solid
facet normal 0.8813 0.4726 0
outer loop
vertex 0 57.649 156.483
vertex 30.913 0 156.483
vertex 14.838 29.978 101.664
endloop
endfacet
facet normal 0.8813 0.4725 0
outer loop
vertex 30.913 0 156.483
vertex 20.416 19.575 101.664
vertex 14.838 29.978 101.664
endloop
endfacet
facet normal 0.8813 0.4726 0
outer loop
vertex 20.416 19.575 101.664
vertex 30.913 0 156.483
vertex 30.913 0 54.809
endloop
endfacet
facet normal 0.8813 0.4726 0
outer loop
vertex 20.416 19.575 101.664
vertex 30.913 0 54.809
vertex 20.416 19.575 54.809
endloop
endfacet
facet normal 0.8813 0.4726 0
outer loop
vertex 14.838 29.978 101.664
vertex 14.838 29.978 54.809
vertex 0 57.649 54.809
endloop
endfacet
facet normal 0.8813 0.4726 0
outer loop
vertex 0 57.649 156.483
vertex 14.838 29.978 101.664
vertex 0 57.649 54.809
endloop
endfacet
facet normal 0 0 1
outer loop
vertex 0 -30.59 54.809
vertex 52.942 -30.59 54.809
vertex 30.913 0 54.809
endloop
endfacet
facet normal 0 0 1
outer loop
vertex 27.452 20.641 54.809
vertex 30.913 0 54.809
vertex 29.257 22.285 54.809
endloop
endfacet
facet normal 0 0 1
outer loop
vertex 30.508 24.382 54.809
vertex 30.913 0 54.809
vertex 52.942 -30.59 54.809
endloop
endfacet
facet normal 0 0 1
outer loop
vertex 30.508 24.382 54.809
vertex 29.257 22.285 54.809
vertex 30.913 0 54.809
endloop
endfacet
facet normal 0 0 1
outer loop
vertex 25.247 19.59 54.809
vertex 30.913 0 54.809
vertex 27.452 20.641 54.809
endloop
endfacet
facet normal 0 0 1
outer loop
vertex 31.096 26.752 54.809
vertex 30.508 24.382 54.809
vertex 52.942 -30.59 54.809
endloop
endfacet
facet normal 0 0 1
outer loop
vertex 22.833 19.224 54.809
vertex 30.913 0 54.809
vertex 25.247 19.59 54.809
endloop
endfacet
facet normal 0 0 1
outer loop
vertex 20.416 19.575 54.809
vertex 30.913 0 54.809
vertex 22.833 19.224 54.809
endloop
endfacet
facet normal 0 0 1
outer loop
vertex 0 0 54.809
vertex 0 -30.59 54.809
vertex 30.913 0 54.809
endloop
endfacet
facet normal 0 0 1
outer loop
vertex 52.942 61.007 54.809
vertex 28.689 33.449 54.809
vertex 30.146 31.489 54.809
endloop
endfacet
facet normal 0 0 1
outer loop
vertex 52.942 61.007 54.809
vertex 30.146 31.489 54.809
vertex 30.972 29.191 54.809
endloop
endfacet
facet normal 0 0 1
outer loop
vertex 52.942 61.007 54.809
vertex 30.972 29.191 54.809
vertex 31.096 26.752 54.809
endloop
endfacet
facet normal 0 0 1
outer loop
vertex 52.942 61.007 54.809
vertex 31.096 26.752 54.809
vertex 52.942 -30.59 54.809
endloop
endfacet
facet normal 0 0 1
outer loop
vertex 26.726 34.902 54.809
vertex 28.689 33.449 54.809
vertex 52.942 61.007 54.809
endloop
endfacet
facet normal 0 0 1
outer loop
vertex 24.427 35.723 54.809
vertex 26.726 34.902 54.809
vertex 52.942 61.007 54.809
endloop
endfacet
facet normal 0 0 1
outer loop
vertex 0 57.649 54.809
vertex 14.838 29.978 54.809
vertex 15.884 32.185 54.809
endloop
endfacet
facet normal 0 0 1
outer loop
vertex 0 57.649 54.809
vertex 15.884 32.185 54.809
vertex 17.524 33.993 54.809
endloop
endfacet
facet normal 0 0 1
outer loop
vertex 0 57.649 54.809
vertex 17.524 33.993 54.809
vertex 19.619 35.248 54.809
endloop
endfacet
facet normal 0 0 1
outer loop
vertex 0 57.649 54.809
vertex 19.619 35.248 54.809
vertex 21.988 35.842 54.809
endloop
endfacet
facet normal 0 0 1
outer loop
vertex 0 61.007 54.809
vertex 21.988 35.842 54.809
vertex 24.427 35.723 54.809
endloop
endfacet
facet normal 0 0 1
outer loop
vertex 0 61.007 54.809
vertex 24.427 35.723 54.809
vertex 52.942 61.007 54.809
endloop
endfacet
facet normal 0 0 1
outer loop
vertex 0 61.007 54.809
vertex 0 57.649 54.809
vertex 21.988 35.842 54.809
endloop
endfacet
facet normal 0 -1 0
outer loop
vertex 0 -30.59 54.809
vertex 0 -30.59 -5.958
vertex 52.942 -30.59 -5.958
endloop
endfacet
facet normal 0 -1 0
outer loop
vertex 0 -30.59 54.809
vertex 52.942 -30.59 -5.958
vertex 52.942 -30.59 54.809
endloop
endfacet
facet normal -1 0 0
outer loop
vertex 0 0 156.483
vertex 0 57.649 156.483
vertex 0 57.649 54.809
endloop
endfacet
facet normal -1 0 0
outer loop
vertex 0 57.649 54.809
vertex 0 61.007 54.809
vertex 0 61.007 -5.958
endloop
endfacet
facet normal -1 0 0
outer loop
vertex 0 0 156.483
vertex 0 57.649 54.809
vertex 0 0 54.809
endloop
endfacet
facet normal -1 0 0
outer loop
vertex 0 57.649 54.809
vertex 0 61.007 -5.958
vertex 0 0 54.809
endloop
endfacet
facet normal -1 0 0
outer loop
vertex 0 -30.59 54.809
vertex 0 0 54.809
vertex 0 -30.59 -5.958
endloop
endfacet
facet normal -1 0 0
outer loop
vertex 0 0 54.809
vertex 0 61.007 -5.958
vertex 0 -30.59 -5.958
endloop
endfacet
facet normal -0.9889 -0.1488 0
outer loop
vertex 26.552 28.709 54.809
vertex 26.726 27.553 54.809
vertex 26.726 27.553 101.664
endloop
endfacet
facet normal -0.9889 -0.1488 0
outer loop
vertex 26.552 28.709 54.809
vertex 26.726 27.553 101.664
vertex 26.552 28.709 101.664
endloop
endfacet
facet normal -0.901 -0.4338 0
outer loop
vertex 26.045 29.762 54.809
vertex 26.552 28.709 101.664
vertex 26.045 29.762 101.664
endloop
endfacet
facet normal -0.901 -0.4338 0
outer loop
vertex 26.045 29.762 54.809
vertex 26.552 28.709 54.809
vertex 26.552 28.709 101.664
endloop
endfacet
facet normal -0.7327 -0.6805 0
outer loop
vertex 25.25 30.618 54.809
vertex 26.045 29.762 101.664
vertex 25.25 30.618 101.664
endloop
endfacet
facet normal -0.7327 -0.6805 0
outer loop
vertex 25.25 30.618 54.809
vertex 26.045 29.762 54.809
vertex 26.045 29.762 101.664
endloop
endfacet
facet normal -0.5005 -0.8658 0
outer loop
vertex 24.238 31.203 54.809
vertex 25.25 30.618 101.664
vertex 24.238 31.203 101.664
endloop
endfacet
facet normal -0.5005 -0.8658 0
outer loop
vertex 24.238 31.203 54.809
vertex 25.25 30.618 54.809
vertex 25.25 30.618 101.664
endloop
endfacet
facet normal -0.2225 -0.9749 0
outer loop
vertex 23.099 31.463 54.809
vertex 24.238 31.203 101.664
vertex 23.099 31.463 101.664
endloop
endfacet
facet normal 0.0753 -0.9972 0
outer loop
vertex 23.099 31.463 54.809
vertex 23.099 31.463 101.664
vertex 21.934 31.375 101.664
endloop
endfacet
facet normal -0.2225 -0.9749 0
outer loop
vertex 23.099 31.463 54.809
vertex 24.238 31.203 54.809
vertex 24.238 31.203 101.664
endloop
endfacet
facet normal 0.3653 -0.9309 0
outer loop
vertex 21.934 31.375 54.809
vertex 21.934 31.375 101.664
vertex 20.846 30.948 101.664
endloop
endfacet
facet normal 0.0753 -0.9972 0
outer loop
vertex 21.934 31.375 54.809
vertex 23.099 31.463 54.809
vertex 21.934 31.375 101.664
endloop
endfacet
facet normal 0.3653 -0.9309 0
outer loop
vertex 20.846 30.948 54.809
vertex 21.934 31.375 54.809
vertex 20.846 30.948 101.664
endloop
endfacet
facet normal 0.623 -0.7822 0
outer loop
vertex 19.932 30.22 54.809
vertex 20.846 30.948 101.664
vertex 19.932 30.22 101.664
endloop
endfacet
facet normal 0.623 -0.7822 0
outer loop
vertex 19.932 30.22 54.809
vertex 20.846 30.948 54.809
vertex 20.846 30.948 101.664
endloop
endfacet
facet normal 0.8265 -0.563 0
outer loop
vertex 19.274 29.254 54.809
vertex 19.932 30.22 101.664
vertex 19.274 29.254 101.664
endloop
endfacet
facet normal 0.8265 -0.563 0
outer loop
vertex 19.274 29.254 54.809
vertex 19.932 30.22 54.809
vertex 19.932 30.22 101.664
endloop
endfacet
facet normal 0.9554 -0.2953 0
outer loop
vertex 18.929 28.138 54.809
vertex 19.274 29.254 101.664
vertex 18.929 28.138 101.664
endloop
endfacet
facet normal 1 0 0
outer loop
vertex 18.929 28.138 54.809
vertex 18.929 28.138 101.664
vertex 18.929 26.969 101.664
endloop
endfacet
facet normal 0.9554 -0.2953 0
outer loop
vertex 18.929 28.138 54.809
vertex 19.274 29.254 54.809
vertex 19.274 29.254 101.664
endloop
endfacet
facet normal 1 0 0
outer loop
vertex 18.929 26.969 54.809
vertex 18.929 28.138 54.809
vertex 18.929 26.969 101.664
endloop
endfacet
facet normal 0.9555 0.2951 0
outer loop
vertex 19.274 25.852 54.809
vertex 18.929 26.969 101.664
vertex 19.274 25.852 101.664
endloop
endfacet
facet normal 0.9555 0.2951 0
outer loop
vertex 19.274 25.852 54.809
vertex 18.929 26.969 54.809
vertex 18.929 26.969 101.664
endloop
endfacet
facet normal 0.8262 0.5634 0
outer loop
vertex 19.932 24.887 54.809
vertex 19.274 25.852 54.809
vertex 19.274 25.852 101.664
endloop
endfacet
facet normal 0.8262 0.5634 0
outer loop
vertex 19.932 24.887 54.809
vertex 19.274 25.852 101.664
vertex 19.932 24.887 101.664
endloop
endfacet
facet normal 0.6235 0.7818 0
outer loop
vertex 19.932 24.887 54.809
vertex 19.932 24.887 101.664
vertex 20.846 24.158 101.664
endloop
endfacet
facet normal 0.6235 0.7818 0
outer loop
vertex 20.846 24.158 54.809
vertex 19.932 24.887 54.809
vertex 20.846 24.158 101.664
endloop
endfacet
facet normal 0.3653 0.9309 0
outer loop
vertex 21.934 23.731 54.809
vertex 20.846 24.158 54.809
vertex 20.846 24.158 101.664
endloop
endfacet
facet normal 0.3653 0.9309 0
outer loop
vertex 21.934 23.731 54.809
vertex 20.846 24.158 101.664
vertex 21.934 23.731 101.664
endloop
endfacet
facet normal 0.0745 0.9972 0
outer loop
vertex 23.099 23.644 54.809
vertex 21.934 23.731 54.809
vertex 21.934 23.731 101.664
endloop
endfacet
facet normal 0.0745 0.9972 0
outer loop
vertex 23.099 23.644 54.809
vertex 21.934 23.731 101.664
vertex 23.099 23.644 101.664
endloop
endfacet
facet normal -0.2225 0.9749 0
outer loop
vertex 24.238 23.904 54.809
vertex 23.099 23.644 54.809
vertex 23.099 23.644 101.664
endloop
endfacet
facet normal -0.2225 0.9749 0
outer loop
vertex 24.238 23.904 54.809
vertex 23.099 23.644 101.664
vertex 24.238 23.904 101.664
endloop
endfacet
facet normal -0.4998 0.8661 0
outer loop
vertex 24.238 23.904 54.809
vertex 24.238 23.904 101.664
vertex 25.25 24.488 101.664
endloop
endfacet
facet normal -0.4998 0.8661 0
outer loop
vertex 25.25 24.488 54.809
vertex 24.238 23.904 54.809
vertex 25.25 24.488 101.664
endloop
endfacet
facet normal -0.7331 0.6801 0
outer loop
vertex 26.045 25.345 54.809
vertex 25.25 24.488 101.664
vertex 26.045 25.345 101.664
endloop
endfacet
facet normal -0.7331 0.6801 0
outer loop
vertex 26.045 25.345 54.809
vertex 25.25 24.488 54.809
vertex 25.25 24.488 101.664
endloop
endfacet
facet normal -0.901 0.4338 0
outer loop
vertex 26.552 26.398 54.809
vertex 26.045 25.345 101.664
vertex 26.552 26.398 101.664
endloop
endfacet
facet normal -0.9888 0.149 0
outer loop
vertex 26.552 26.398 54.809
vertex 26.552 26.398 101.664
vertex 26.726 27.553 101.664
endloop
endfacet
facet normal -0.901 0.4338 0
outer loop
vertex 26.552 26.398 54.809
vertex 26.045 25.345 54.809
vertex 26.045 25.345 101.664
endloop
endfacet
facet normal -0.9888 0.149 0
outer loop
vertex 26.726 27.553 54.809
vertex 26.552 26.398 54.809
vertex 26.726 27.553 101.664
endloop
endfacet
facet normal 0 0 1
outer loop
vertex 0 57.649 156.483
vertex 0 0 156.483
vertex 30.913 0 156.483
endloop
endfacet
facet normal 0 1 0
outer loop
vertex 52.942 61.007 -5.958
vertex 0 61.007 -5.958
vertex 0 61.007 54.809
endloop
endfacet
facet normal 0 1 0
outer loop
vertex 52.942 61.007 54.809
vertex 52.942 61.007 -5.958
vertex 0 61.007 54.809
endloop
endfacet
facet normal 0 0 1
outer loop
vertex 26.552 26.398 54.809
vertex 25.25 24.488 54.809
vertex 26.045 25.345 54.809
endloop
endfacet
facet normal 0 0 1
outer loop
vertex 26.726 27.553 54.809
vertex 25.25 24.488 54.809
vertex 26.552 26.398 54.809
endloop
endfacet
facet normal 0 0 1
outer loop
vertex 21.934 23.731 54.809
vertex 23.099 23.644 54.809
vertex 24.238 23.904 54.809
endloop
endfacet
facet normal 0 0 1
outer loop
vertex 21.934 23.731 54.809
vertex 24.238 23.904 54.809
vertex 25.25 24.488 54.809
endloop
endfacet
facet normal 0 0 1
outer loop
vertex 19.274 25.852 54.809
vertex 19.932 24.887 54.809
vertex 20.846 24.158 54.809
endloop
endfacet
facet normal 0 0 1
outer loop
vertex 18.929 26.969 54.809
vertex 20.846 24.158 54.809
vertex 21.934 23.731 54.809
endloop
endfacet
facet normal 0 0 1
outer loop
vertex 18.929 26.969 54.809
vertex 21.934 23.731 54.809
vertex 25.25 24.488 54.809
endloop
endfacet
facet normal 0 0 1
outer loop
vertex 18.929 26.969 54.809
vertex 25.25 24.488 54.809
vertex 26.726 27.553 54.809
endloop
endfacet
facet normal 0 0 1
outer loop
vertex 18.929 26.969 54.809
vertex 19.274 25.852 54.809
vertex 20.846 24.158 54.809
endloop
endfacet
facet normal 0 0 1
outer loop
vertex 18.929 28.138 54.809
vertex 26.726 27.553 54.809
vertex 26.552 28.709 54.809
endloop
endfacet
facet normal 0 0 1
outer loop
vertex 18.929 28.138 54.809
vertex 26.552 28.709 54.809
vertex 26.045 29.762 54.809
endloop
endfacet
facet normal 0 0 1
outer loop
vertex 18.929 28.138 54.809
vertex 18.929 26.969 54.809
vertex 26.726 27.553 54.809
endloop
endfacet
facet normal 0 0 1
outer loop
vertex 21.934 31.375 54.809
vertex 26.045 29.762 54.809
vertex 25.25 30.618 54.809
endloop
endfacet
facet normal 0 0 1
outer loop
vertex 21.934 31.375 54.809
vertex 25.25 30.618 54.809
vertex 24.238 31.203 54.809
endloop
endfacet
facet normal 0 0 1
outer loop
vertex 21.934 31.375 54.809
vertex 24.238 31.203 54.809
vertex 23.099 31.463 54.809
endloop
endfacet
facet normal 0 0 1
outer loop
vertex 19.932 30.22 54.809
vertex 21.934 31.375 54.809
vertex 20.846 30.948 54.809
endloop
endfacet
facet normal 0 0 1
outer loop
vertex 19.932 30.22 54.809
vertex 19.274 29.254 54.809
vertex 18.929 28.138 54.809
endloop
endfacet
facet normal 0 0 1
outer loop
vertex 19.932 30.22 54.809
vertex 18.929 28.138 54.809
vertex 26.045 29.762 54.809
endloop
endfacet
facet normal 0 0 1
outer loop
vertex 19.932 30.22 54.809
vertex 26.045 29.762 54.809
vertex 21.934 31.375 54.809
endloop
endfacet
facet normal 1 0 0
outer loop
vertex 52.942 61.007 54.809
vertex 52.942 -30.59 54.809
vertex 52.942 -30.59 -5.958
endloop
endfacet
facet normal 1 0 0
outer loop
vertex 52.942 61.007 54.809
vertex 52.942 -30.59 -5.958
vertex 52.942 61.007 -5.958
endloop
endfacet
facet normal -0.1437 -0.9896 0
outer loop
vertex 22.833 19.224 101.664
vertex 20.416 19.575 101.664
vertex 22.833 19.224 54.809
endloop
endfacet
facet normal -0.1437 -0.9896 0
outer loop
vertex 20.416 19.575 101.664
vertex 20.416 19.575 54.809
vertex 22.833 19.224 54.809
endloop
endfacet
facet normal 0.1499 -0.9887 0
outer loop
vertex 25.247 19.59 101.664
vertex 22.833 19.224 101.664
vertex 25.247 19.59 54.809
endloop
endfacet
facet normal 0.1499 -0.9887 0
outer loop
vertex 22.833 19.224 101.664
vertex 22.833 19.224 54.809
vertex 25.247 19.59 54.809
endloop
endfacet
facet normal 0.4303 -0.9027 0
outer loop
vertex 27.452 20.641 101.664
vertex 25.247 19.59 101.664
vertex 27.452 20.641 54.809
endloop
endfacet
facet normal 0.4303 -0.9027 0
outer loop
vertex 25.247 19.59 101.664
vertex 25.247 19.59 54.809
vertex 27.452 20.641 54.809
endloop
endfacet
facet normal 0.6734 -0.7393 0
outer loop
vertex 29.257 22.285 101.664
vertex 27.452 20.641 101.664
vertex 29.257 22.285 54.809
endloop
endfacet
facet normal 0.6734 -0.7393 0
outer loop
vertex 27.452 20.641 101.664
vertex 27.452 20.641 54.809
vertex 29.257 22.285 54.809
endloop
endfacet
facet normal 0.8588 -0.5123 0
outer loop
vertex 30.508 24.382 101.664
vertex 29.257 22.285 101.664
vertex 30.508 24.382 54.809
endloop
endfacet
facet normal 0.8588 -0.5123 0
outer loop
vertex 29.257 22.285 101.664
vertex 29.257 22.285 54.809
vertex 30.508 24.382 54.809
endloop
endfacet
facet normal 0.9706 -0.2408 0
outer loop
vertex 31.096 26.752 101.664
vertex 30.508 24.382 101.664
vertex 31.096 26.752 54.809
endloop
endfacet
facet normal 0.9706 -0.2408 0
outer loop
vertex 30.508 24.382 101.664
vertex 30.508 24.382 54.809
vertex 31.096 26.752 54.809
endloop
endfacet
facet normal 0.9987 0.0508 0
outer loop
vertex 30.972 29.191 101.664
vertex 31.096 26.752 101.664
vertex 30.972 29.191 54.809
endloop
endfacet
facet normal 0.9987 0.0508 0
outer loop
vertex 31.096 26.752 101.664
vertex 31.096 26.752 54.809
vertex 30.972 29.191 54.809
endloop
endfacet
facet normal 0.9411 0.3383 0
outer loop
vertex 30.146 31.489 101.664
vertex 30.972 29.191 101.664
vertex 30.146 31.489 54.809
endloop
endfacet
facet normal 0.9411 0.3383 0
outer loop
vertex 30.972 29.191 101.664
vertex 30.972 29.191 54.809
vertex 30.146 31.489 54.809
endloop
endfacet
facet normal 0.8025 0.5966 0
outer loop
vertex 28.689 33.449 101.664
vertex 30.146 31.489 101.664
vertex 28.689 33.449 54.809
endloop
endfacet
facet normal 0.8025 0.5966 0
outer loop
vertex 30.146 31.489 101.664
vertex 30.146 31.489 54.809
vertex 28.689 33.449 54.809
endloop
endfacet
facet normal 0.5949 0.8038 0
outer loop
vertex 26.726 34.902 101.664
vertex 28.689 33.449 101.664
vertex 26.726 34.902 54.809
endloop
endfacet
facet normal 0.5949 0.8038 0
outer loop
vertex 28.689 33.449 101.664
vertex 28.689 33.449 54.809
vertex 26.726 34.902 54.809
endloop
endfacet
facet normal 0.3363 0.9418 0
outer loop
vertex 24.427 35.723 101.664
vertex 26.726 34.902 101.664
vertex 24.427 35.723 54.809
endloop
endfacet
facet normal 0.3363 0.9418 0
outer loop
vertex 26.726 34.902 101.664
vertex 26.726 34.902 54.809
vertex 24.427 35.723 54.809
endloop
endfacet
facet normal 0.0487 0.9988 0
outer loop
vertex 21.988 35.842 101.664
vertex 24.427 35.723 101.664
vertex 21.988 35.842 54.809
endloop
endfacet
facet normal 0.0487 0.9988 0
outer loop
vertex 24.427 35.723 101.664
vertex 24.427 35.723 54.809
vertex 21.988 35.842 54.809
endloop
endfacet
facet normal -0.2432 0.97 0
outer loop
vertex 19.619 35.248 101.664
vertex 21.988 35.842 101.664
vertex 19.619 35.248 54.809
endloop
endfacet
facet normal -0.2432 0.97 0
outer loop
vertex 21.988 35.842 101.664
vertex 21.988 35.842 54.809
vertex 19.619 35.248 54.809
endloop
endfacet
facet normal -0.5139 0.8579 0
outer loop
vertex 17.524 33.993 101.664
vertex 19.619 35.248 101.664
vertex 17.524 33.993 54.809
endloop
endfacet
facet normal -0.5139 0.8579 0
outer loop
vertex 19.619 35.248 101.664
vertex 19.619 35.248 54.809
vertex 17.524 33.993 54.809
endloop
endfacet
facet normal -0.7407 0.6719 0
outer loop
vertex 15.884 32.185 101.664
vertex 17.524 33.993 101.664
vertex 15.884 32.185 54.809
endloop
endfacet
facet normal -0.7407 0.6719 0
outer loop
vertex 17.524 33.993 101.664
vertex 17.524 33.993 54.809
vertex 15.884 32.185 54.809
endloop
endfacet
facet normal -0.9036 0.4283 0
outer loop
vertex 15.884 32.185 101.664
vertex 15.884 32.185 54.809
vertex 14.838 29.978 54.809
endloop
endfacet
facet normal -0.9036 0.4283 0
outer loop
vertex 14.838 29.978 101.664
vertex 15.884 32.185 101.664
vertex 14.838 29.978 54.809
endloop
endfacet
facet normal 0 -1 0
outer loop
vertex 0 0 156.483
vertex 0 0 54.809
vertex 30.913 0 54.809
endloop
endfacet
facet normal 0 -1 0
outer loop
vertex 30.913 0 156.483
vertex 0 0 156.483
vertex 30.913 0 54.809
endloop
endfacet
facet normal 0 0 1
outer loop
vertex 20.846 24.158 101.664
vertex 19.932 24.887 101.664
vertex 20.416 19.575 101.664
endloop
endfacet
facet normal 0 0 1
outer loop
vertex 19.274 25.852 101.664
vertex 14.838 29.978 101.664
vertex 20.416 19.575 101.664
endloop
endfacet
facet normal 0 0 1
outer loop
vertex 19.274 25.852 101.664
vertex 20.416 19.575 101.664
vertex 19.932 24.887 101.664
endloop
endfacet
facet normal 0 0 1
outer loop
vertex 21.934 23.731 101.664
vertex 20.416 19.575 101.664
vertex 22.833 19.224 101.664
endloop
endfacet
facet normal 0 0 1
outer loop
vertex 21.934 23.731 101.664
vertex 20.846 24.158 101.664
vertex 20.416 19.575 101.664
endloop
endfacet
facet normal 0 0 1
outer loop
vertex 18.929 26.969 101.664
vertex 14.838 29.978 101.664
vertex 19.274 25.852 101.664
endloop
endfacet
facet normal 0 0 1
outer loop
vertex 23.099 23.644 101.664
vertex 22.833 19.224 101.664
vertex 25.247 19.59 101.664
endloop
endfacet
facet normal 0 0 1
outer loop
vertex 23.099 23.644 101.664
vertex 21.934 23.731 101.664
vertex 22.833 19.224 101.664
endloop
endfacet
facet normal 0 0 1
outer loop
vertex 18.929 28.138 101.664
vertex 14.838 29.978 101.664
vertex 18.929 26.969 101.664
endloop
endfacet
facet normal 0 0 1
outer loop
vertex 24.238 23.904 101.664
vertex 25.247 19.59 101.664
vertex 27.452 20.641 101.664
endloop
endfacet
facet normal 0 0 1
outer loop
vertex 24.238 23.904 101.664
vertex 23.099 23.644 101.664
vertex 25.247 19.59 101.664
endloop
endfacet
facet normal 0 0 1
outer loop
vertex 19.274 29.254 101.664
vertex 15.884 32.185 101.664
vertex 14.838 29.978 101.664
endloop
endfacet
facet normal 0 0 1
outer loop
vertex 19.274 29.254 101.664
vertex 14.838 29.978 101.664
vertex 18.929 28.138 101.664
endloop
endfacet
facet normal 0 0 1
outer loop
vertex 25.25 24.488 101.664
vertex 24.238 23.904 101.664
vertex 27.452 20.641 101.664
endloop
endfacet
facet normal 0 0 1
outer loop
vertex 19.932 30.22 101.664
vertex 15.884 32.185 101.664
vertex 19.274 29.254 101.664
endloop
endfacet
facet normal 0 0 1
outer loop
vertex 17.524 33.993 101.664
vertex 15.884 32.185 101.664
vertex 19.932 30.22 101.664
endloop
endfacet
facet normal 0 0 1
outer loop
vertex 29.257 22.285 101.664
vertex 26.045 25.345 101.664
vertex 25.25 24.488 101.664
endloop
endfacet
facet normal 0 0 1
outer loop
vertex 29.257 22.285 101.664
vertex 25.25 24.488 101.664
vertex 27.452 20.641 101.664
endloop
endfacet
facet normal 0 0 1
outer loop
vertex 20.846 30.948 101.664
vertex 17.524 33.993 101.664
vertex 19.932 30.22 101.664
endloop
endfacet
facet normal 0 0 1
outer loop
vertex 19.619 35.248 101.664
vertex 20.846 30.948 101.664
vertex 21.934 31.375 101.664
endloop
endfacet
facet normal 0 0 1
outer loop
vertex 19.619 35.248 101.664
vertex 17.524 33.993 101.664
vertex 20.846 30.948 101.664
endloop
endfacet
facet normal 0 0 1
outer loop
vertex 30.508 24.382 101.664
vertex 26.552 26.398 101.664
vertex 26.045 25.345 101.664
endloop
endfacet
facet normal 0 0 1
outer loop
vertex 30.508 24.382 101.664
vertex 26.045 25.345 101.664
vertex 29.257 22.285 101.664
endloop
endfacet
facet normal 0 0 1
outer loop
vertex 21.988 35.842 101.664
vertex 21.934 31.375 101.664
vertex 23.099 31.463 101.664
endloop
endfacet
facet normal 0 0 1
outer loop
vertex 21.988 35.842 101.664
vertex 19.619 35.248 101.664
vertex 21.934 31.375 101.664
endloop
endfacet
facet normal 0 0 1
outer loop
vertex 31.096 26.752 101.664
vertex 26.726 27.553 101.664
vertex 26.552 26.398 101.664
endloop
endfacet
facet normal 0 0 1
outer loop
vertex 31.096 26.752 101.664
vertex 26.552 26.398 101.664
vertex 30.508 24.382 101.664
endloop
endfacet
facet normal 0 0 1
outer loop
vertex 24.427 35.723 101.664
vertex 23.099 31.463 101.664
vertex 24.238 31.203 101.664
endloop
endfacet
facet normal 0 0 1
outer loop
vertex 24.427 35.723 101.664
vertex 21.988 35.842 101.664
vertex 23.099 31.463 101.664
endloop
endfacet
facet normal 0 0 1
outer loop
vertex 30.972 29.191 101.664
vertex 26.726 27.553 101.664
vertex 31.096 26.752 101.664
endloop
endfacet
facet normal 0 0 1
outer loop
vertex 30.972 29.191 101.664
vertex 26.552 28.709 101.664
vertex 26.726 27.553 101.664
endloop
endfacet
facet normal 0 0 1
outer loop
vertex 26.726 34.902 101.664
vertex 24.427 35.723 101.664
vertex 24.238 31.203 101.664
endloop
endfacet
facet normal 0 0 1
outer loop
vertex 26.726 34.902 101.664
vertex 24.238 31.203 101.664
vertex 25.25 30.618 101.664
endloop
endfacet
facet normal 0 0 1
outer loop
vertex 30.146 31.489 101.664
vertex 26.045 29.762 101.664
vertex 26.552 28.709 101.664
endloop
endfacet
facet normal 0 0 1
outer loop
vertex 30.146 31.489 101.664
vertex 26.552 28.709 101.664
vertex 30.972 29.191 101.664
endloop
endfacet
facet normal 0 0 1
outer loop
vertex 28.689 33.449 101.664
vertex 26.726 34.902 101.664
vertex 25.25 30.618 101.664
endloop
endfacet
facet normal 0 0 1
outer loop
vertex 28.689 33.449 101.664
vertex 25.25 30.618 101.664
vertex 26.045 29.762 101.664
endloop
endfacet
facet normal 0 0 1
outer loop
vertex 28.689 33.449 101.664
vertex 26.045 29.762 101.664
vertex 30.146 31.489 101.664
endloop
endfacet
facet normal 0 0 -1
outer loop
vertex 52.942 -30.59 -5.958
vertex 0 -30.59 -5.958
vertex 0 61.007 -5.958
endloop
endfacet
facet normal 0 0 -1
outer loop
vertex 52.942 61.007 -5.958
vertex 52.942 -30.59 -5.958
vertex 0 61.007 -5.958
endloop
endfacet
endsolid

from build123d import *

# Parameters (mm, degrees)
F0_W     = 91.597288847
F0_H     = 60.767069459
F1_DEPTH = 52.9421810061
F2_R     = 8.3288668083
F2_R_2   = 3.9203402896
F3_DEPTH = 46.854743734
F6_DEPTH = 101.6741897911


with BuildPart() as f1:
    # F0 (on Right) → F1 (new body)
    with BuildSketch(Plane.YZ):
        with Locations((15.2086205781, 24.4252681732)):
            Rectangle(F0_W, F0_H)
    extrude(amount=F1_DEPTH)

    # F2 (on face) → F3 (join)
    with BuildSketch(Plane.XY.offset(54.8088029027)):
        with Locations((22.8059887886, 27.5532379746)):
            Circle(F2_R)
        with Locations((22.8059887886, 27.5532379746)):
            Circle(F2_R_2, mode=Mode.SUBTRACT)
    extrude(amount=F3_DEPTH)

    # F5 (on face) → F6 (join)
    with BuildSketch(Plane.XY.offset(54.8088029027)):
        Polygon((0, 0), (30.9126600623, 0), (0, 57.6490387321), align=None)
    extrude(amount=F6_DEPTH)


solid = f1.part
